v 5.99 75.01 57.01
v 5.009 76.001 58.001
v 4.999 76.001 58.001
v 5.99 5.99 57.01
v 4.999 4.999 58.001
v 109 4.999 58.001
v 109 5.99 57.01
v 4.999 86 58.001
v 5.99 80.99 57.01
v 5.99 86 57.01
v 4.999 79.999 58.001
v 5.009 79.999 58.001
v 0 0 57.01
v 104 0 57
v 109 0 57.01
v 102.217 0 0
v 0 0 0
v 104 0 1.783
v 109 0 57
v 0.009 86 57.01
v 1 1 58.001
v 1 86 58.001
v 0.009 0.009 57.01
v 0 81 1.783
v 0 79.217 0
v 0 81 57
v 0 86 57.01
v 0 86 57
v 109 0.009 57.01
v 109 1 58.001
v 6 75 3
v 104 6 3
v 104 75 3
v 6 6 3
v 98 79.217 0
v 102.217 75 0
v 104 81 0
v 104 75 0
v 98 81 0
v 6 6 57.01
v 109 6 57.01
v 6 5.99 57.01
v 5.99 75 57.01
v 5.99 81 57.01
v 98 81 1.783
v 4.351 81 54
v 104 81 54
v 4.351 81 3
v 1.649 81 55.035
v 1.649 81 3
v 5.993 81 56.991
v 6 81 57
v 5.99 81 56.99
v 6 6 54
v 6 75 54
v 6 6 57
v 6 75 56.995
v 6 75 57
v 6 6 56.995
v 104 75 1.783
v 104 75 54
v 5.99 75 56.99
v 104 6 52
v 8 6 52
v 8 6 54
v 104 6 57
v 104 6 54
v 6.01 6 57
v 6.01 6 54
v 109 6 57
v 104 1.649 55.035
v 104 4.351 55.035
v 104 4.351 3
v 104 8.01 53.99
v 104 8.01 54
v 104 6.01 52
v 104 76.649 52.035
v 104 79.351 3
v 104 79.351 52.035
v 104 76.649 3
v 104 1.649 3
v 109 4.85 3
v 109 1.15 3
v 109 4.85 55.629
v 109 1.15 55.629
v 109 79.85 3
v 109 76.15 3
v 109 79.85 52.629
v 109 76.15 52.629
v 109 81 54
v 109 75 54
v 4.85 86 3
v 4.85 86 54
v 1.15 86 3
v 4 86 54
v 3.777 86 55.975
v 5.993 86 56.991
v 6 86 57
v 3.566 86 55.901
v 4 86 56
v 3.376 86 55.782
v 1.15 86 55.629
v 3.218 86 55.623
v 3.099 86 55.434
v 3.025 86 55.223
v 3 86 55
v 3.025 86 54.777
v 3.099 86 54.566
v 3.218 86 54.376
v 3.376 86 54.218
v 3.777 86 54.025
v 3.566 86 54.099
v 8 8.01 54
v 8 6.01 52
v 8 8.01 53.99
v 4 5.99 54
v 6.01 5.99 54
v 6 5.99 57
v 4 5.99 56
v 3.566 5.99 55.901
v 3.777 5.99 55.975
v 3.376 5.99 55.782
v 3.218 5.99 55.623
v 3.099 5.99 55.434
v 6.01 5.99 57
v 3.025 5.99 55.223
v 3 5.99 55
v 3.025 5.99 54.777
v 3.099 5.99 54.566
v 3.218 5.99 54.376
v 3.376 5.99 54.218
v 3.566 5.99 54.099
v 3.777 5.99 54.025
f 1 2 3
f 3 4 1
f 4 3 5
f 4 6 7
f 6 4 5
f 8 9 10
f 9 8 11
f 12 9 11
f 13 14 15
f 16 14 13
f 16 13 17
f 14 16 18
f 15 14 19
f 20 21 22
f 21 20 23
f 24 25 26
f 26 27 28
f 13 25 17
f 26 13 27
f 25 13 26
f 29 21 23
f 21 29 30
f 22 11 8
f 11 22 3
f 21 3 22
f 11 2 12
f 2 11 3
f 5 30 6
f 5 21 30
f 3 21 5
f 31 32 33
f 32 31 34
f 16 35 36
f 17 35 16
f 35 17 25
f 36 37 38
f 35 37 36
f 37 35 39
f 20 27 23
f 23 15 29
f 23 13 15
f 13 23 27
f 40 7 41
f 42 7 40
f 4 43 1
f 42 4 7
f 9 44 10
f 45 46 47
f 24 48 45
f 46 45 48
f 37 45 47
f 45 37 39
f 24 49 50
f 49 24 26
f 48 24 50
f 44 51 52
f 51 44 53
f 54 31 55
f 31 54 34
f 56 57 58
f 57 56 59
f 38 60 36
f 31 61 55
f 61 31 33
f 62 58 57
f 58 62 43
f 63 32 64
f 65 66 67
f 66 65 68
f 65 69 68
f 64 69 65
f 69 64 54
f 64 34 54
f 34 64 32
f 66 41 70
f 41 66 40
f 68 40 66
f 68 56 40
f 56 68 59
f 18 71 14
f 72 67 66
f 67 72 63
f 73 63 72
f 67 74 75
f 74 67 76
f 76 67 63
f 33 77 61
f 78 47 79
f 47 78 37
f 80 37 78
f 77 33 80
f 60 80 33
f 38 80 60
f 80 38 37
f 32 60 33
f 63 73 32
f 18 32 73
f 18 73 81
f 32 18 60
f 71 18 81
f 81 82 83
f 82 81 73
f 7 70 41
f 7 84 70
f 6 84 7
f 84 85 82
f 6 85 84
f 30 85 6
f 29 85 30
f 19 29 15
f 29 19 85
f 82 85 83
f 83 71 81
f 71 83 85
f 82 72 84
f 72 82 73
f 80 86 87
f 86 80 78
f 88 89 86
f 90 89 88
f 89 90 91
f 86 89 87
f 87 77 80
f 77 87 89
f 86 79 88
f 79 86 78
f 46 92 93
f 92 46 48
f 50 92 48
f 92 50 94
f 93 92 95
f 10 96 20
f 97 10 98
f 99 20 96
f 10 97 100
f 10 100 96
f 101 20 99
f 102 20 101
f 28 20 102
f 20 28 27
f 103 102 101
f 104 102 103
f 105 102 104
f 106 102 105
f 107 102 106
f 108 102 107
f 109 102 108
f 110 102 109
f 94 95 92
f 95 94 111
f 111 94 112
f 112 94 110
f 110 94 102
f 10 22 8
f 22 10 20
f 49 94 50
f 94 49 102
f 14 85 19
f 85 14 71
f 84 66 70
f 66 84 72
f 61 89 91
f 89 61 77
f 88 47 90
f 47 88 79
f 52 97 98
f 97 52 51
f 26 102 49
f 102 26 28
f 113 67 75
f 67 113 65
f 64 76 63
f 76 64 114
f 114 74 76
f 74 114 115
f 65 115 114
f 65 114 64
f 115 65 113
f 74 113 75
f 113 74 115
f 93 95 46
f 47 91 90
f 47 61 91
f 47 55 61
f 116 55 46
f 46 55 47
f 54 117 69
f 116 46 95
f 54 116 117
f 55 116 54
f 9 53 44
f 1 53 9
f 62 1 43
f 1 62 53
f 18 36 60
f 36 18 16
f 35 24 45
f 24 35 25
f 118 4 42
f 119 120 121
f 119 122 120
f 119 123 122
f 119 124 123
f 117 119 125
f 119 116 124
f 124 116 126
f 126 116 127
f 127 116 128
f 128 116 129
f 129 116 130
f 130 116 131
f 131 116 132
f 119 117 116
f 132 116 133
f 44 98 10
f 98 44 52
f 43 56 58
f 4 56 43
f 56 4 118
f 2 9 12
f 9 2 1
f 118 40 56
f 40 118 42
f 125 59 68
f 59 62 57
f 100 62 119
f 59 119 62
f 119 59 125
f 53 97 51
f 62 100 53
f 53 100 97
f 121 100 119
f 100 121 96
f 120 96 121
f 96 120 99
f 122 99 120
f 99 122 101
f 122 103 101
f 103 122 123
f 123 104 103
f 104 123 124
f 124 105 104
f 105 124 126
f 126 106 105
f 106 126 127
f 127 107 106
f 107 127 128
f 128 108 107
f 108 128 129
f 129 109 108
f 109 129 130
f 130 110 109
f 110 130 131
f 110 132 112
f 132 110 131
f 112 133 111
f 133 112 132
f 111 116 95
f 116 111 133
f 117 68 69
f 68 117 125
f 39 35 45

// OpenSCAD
// ============================================================================
// cutlery_box.scad
// Graduated 3-chamber disposable-cutlery box (Option 3) — CUT-FROM-SOLID port
// of build_box.py, for a 120 x 120 x 120 mm printer (AOSEED).
//
// WHY THIS PORT EXISTS (the whole point):
//   The hand-mesh generator (build_box.py) could not keep the 1 mm rim chamfer
//   continuous across the female dovetail joints, because where a slot's flared
//   corner crosses the sloped chamfer it needs a true boolean intersection.
//   OpenSCAD HAS that boolean kernel, so here we do exactly the "cut-from-solid"
//   thing:
//      1. Build the ENTIRE box as ONE solid, WITH the chamfer already on it.
//      2. difference() out vertical dovetail prisms ( /_\ cross-section ),
//         running from just above the base plate up THROUGH the rim, to both
//         (a) form the sliding-dovetail joints, and
//         (b) split the box into 6 bed-sized pieces.
//   Because the cut is a real boolean through the already-chamfered solid, the
//   sloped chamfer<->slot edge is produced for free => the rim chamfer stays
//   CONTINUOUS across every joint, with none of the sliver hacks.
//
// ----------------------------------------------------------------------------
// HOW TO USE
//   In the app:  set `part` below (or use the Customizer dropdown), F5 to
//                preview, F6 to render, then File > Export > STL.
//   One piece (CLI):
//      openscad -o body_knife_A.stl -D 'part="knife_A"' cutlery_box.scad
//   ALL SIX (bash, run from this folder):
//      for p in knife_A knife_B fork_A fork_B spoon_A spoon_B; do \
//        openscad -o "body_$p.stl" -D "part=\"$p\"" cutlery_box.scad ; done
//   PNG preview of one piece:
//      openscad -o knife_B.png --imgsize=1400,1000 --autocenter --viewall \
//        -D 'part="knife_B"' cutlery_box.scad
//
//   Pieces are modelled in ASSEMBLED coordinates (floor-down, z=0 is the bed),
//   so importing all six STLs together shows the assembled box directly; your
//   slicer will auto-drop each one onto the plate for printing.
//
// BED SANITY: every piece is <= 120 mm in X, Y, Z.
//   Z = 58 mm. Widest piece = spoon at 117 mm (Y). A-halves reach 109 mm (X,
//   including the protruding dovetail key). All under 120.
//
// !! I could NOT run OpenSCAD to verify this file (no binary in my sandbox) !!
//   - The rim chamfer is a SMOOTH, true-45 bevel built from hull() frustums of
//     convex rectangles. Works in every OpenSCAD since ~2015 (incl. Homebrew
//     2021.01). No stepped staircase -- and, crucially, it makes box() a clean
//     well-formed solid so the per-part booleans resolve reliably (the old
//     14-slice staircase was fragile and CGAL was dropping the walls of the
//     interior parts, leaving only the key prisms => "floating boxes").
//   - roof() is still available behind USE_ROOF=true for those who have it
//     (2021.01+ snapshots); for THIS rectangular design it is identical, so it
//     is NOT required.
//   - After F6, check the console for "WARNING"/"not a valid 2-manifold".
//     If a tenon ever looks detached, bump EPS to 0.05.
// ============================================================================


/* [Part to render / export] */
part = "knife_A"; // [knife_A, knife_B, fork_A, fork_B, spoon_A, spoon_B, assembly]

/* [Chamfer method] */
// false = smooth hull() frustum bevel (default, any OpenSCAD); true = roof() (2021.01+)
USE_ROOF = false;

/* [Heights (mm)] */
BASE   = 3.0;     // floor / base-plate thickness
COMP_H = 55.0;    // interior wall height above the floor (cutlery stack depth)

/* [Walls (mm)] */
HOST_T   = 6.0;     // thickness of every wall (thick enough to host a dovetail)
HALF_LEN = 104.0;   // printed length of each half (A = near, B = far); <120 incl. key

/* [Chamber bays (mm)] */
N_COL     = 3;       // columns of cutlery per chamber
KNIFE_COL = 23.0;    // -> knife bay 69  (3 x 19 mm knives + play)
FORK_COL  = 33.0;    // -> fork  bay 99  (3 x 29 mm forks  + play)
SPOON_COL = 37.0;    // -> spoon bay 111 (3 x 34 mm spoons + play, trimmed <120)

/* [Dovetail joint (mm)] */
// TRIAL-PRINT FIX (Option A) set the FEMALE socket to neck 1.5 / flare 2.0 half
//   (= DT_NECK+DT_CLR / DT_FLARE+DT_CLR), giving ear = HOST_T/2 - flare 2.0 = 1.0 mm.
//   That female side printed great and is now FINAL.
// KEY #2 (full-height slide test, 2026-06): the male was too loose at 0.3 mm/side
//   (popped when pulled horizontally). We tighten the per-side slide clearance
//   0.3 -> 0.15 by GROWING the male tail to neck 1.35 / flare 1.85 half. The SOCKET is
//   UNCHANGED (1.35+0.15 = 1.5, 1.85+0.15 = 2.0), so the already-printed female side is
//   not affected. ear = 3 - (1.85+0.15) = 1.0 mm and undercut hook (DT_FLARE-DT_NECK)
//   = 0.5 mm are both UNCHANGED; only the slide clearance tightens.
DT_DEPTH = 5.0;   // tail protrusion past the seam (male key depth)
DT_NECK  = 1.35;  // male half-width at the seam face (narrow)  [key#2: was 1.2]
DT_FLARE = 1.85;  // male half-width at the tip (wide -> locks) [key#2: was 1.7]
DT_CLR   = 0.15;  // FLANK/seam slide clearance added for the female socket [key#2: was 0.3]
DT_DEPTH_RELIEF = 0.3; // extra depth on the socket BACK only, so the tail tip never bottoms out
// ---- FUTURE TRIAL — Option B (thicker ears still: 1.2 mm) -------------------------
// If Option A's ears still feel thin, try Option B. It buys another 0.2 mm of ear by
// also narrowing the MALE neck (so the male gets a little weaker — that's the trade):
//     DT_NECK  = 1.0;   // was 1.2  (male neck 2.4 -> 2.0 mm full width)
//     DT_FLARE = 1.5;   // was 2.1
//     DT_CLR   = 0.3;   // same as Option A
//   -> ear = 3 - (1.5 + 0.3) = 1.2 mm ; undercut hook = 1.5 - 1.0 = 0.5 mm (same as A).
// Only switch ONE option in at a time; re-test the knife pair before committing all six.
// ----------------------------------------------------------------------------------

/* [Hidden-dovetail top cap / "hat" (mm)] */
// The dovetail otherwise shows its trapezoid outline on the TOP edge of the wall.
// To hide it, the MALE piece extends the wall's full-width top (chamfer included)
// across the key footprint -> a flush, continuous top. The FEMALE piece gets a
// matching top RECESS (cap footprint + CAP_CLR) so the cap drops straight in.
// Result: the top reads as one surface with a single straight seam line at the cap
// tip; the dovetail joinery lives entirely below the cap.
//
// SELF-SUPPORTING UNDERSIDE: the cap reaches the FULL wall width at the chamfer base
// (so the top edge reads as the wall extended, with NO recessed sliver on the outer
// face), and its underside is ONE planar ramp from the chamfer's OUTER CORNER
// (half-width HOST_T/2 at z = BODY_H-CHAMFER) down to the dovetail-neck half-width
// (CAP_FOOT) at CAP_SLANT_DEG from horizontal. No little horizontal step. The ramp
// reaching full width exactly at the chamfer base means "ramp top" == "chamfer base"
// (CAP_H is DERIVED). The FEMALE recess is the same ramp + CAP_CLR play.
// TRADEOFF: because the cap runs all the way to the outer corner, the female wall
// tapers to ~0 at z = BODY_H-CHAMFER -> a thin feather edge at the joint (gradual at
// CAP_SLANT_DEG, hidden inside the joint when assembled). Accepted per design intent.
CAP_SLANT_DEG = 50;     // cap underside ramp angle from horizontal (50 = self-supporting, long flare)
CAP_FOOT = 1.2;         // cap-underside half-width [PINNED to the pre-key#2 neck so the
                        // FINAL female cap-recess (CAP_FOOT+CAP_CLR) is unchanged; the
                        // 0.15 mm tongue-vs-cap-foot step is buried inside the joint]
CAP_CLR = 0.3;          // slide clearance so the male cap seats into the female top recess

/* [Rim chamfer (mm)] */
CHAMFER = 1.0;    // 45-deg comfort break broken along the top wall edges

/* [Base half-lap / anti-warp (mm)] */
// Neighbouring base plates overlap as a HORIZONTAL half-lap (shiplap) at mid-base
// height, so corners stay coplanar (no lift/protrusion). Horizontal lap faces do
// NOT bind the vertical-drop assembly. Shingle direction: A->B and knife->fork->spoon.
LAP_LEN = 6;        // overlap past the A/B seam and the knife/fork seam
LAP_LEN_FS = 2;     // overlap past the fork/SPOON seam -- SMALLER: spoon is the
                    // tightest piece (117mm of the 120mm bed); a 6mm lap there
                    // would push spoon to 123mm. 2mm keeps spoon at 119mm.
LAP_Z   = BASE/2;   // 1.5 -- horizontal split height of the lap (bottom vs top half)
LAP_CLR = 0.2;      // in-plane clearance so the shelf isn't a press fit

/* [Lid — box features that receive a flat ORDERED clear sheet] */
// The lid itself is NOT printed: it's a flat ~2 mm PETG/Tritan sheet, bullnose-polished
// edges (r=LID_EDGE_R), ordered to size. We only model the box features that receive it.
LID_T            = 2.0;   // ordered sheet thickness
LID_EDGE_R       = 1.0;   // ordered sheet bullnose edge radius (for the sheet order spec)
LID_PLAY         = 0.4;   // total vertical play in the hinge groove (sheet + this)
LID_RECESS       = 2.0;   // lid TOP sits this far BELOW the rim, so the journal pocket is fully
                          // capped (rim caps the bullnose -> retains the lid when raised; tilt-in)
HINGE_AT_MINUS_X = true;  // hinge on the -x (303mm) end wall; clip on +x. (flip = mirror; default delivered)
// perimeter support ledge (lid underside rests on it at z = BODY_H-LID_T)
LEDGE_W          = 2.0;   // ledge inward protrusion (its underside ramps back at 45 deg -> self-supporting)
GROOVE_END_INSET = 0.0;   // groove reaches the corners but RUNS OUT smoothly there (no end-face / no
                          // exposed bore); GROOVE_TAPER sets the run-out length
GROOVE_TAPER     = 4.0;   // y-length over which the eased mouth tapers out at each groove end
// hinge journal (cut into the inner face of the hinge end wall, CONTINUOUS along the long edge)
GROOVE_DEPTH     = 3.0;   // 2mm lead-in slot + 1mm pocket radius -> journal sits 2mm back from the
                          // face so its cap clears the swing relief and RETAINS the lid
GROOVE_POCKET_R  = 1.0;   // journal half-cylinder radius (the bullnose sheet edge rolls in it)
// clip latch — TWO light DETENT clips on the clip end wall, flanking a central finger notch.
// "Light detent" = small overhang so the rigid sheet pops past it by hand (not a firm lock).
CLIP_W           = 8.0;   // width of EACH of the two clips
CLIP_LIP         = 0.3;   // retaining overhang (light detent; 0.3 soft .. 0.6 firm-but-stiff)
CLIP_RAMP_H      = 1.6;   // cam-ramp height (press-to-close lead-in)
// finger notch — a through-cut in the clip wall (visible from outside), centered between the
// two clips, so a fingertip can reach the lid edge and lift it (popping both clips at once).
NOTCH_W          = 20.0;  // finger-notch width
NOTCH_DEPTH      = 6.0;   // how far down from the rim to the deepest point (past the lid edge)
NOTCH_ARCH       = 4.0;   // bottom is an ELLIPTICAL arch this tall; the rest is vertical sides
                          // (NOTCH_ARCH < NOTCH_W/2 -> a gentle arch, not a deep half-circle)


/* [Hidden] */
EPS      = 0.01;          // tiny overlap so abutting solids fuse cleanly in CGAL
// Upper-chamber pieces (fork, spoon) were cut by a cell plane laid EXACTLY on the
// divider wall's far face (the lower chamber owns that wall). intersection() along a
// plane coincident with an existing box face makes CGAL leave a ZERO-THICKNESS copy
// of the wall face -> edge-manifold + "watertight" but degenerate (OpenSCAD shows it
// as a blue back-face; Tinkercad thickens it into a phantom block). SEAM_EPS nudges
// those cut planes a hair INTO the open bay so they no longer coincide with any box
// face -> no flap. 0.02 mm is physically nothing but is well clear of CGAL's tolerance.
SEAM_EPS = 0.02;
CUT_OVER = 1.0;           // how far dovetail cutters overshoot the rim (clean cut)

BODY_H    = BASE + COMP_H;     // 58  total height
END_WALL  = HOST_T;            // end walls are dovetail hosts too -> equally thick
TOTAL_LEN = 2 * HALF_LEN;      // 208 assembled length (end wall .. end wall)

// hidden-cap ramp geometry (derived).
//   CAP_HW    = cap MAX half-width = HOST_T/2 (the full wall edge) at the chamfer base.
//   CAP_RISE  = vertical height of the self-supporting CAP_SLANT_DEG underside ramp.
//   CAP_ZRAMP = where the cap reaches full width = the chamfer base (BODY_H-CHAMFER), so
//               the ramp runs straight to the chamfer OUTER CORNER (no horizontal step).
//   CAP_ZBOT  = cap bottom = ramp start; CAP_H derived from it (for reference/report).
//   CAP_ZRAMP_R = recess ramp top, shifted down by CAP_CLR so the recess ramp stays
//               parallel to the cap ramp with uniform play.
CAP_HW      = HOST_T/2;   // cap reaches the FULL wall edge at the chamfer base
CAP_RISE    = (CAP_HW - CAP_FOOT) * tan(CAP_SLANT_DEG);
CAP_ZRAMP   = BODY_H - CHAMFER;               // full width exactly at the chamfer base / outer corner
CAP_ZBOT    = CAP_ZRAMP - CAP_RISE;
CAP_H       = BODY_H - CAP_ZBOT;              // derived; reported
CAP_ZRAMP_R = CAP_ZRAMP;   // recess ramp ALSO tops at the chamfer corner (mirror the cap) -> no vertical lip
// sanity checks
assert(CAP_ZBOT > BASE + 1,
       "cap zone dips too low -- raise CAP_SLANT_DEG");
assert(CAP_HW >= DT_FLARE,
       "cap too narrow to cover the dovetail tail");

// NOTE: lid-derived constants are defined BELOW the Y-layout block, because some of
// them (INTERIOR_Y0/Y1, CLIP_CY) depend on OUTER_L / OUTER_R / EXT_W. See "lid derived".

// bay widths
KNIFE_BAY = N_COL * KNIFE_COL; // 69
FORK_BAY  = N_COL * FORK_COL;  // 99
SPOON_BAY = N_COL * SPOON_COL; // 111

// ---- Y layout (width direction): wall | bay | divider | bay | divider | bay | wall
KNIFE_Y0 = 0;
KNIFE_Y1 = HOST_T + KNIFE_BAY + HOST_T;        // 0..81   (outer wall + bay + divider)
FORK_Y0  = KNIFE_Y1;                           // 81
FORK_Y1  = FORK_Y0 + FORK_BAY + HOST_T;        // 81..186 (bay + divider)
SPOON_Y0 = FORK_Y1;                            // 186
SPOON_Y1 = SPOON_Y0 + SPOON_BAY + HOST_T;      // 186..303(bay + outer wall)
EXT_W    = SPOON_Y1;                           // 303 total width

// lengthwise wall Y-bands [y0,y1] (host the A/B dovetails) + their centers
OUTER_L  = [0, HOST_T];                                       // [0,6]    c=3
DIV_KF   = [HOST_T + KNIFE_BAY, HOST_T + KNIFE_BAY + HOST_T]; // [75,81]  c=78
DIV_FS   = [FORK_Y0 + FORK_BAY, FORK_Y0 + FORK_BAY + HOST_T]; // [180,186]c=183
OUTER_R  = [SPOON_Y1 - HOST_T, SPOON_Y1];                     // [297,303]c=300

// ---- lid derived ---- (placed AFTER OUTER_L/OUTER_R/EXT_W so nothing is forward-referenced)
LID_TOP_Z   = BODY_H - LID_RECESS;        // 56  lid TOP (recessed); rim z=58 rises LID_RECESS above it
LID_Z_UNDER = LID_TOP_Z - LID_T;          // 54  lid underside / ledge top / lowered-divider top
POCKET_CZ   = LID_TOP_Z - LID_T/2;        // 55  journal centre (lid mid) -> pocket top = LID_TOP_Z = capped
// hinge end-wall inner face x + inward direction; clip end-wall inner face x + inward dir
HINGE_INX   = HINGE_AT_MINUS_X ? END_WALL : TOTAL_LEN - END_WALL;       // 6  (default)
HINGE_IN    = HINGE_AT_MINUS_X ? 1 : -1;  // interior direction from the hinge wall (+x default)
CLIP_INX    = HINGE_AT_MINUS_X ? TOTAL_LEN - END_WALL : END_WALL;       // 202 (default)
CLIP_IN     = HINGE_AT_MINUS_X ? -1 : 1;  // interior direction from the clip wall (-x default)
POCKET_CX   = HINGE_INX - HINGE_IN*(GROOVE_DEPTH - GROOVE_POCKET_R);    // 5  pocket centre x (INTO the wall)
INTERIOR_Y0 = OUTER_L[1];                 // 6   inner face of the -y short wall
INTERIOR_Y1 = OUTER_R[0];                 // 297 inner face of the +y short wall
CLIP_CY     = EXT_W/2;                     // 151.5 clip/scallop centre (in the fork chamber)
assert(POCKET_CZ - GROOVE_POCKET_R > BASE + 1,
       "journal dips too low -- reduce LID_RECESS or LID_T");
assert(POCKET_CZ + GROOVE_POCKET_R <= LID_TOP_Z + EPS,
       "journal not capped -- lower the lid (raise LID_RECESS) or shrink GROOVE_POCKET_R");
// NOTE: with LID_RECESS the lid underside (and lowered dividers) sit BELOW CAP_ZBOT. That is
// intended: the inner dividers are cut flat below the cap zone (their hidden caps are removed,
// but the lid covers them); the perimeter/end-wall caps are untouched (full-height walls).

// the three OPEN bays are rectangular holes in the wall footprint:
//   footprint = outer rectangle MINUS these bays  (== the 6 walls; verified).
// The smooth chamfer is built from exactly this decomposition.
BAY_X0 = END_WALL;              // 6
BAY_X1 = TOTAL_LEN - END_WALL;  // 202
BAYS = [
    [BAY_X0, BAY_X1, HOST_T,   HOST_T + KNIFE_BAY],   // knife bay [6,202] x [6,75]
    [BAY_X0, BAY_X1, FORK_Y0,  FORK_Y0 + FORK_BAY],   // fork  bay [6,202] x [81,180]
    [BAY_X0, BAY_X1, SPOON_Y0, SPOON_Y0 + SPOON_BAY], // spoon bay [6,202] x [186,297]
];

YC_OUTL  = OUTER_L[0] + HOST_T/2;   // 3   outer-left wall center
YC_DIVKF = DIV_KF[0]  + HOST_T/2;   // 78  knife/fork divider center
YC_DIVFS = DIV_FS[0]  + HOST_T/2;   // 183 fork/spoon divider center
YC_OUTR  = OUTER_R[0] + HOST_T/2;   // 300 outer-right wall center

// seams
AB_SEAM = HALF_LEN;               // 104  A/B length seam (x)
SEAM_KF = FORK_Y0;                // 81   knife/fork width seam (y)
SEAM_FS = SPOON_Y0;              // 186  fork/spoon width seam (y)
ENDC_A  = END_WALL/2;             // 3    A end-wall center (x) -> chamber dovetails
ENDC_B  = TOTAL_LEN - END_WALL/2; // 205  B end-wall center (x)


// ============================================================================
// 2D wall footprint (cross-section of all walls, constant in z for the straight
// part). Union of: 2 full-width end walls + 4 lengthwise walls between them.
// ============================================================================
module wall_footprint_2d() {
    // footprint = outer rectangle minus the 3 open bays  (== the 6 walls)
    difference() {
        square([TOTAL_LEN, EXT_W]);
        for (b = BAYS) translate([b[0], b[2]]) square([b[1] - b[0], b[3] - b[2]]);
    }
}

// ============================================================================
// The full chamfered box solid = base plate + walls with a continuous 1 mm
// top-rim chamfer. Built ONCE; every piece is carved out of this.
// ============================================================================
module chamfer_cap() {
    // SMOOTH 45 rim chamfer over z[BODY_H-CHAMFER, BODY_H], in absolute coords.
    zm = BODY_H - CHAMFER;
    if (USE_ROOF) {
        // exact straight-skeleton roof, capped at CHAMFER height (needs roof()).
        intersection() {
            translate([0,0,zm]) roof() wall_footprint_2d();
            translate([0,0,zm]) linear_extrude(CHAMFER + EPS) wall_footprint_2d();
        }
    } else {
        // DEFAULT: true 45 bevel as hull() frustums of CONVEX rectangles -> smooth
        // AND a clean manifold.  Since footprint = outer - bays, the chamfer of the
        // footprint = (outer rectangle beveled inward) MINUS (each bay beveled so it
        // grows toward the top, which bevels every bay-facing rim).  All hull()s are
        // on convex rectangles, so nothing gets convex-filled.
        difference() {
            // outer perimeter frustum: full outer rect at zm -> inset by CHAMFER at top
            hull() {
                translate([0,0,zm])     linear_extrude(0.001) square([TOTAL_LEN, EXT_W]);
                translate([0,0,BODY_H]) linear_extrude(0.001) offset(delta=-CHAMFER) square([TOTAL_LEN, EXT_W]);
            }
            // each bay grows by CHAMFER toward the top -> bevels its surrounding rim.
            // (overshoots z a hair past both ends so the cut is clean.)
            for (b = BAYS)
                hull() {
                    translate([0,0,zm-EPS])     linear_extrude(0.001)
                        translate([b[0],b[2]]) offset(delta=-EPS)        square([b[1]-b[0], b[3]-b[2]]);
                    translate([0,0,BODY_H+EPS]) linear_extrude(0.001)
                        translate([b[0],b[2]]) offset(delta=CHAMFER+EPS) square([b[1]-b[0], b[3]-b[2]]);
                }
        }
    }
}

module box() {
    zm = BODY_H - CHAMFER;
    union() {
        cube([TOTAL_LEN, EXT_W, BASE]);                                        // base plate z[0,3]
        translate([0,0,BASE]) linear_extrude(zm - BASE + EPS) wall_footprint_2d(); // straight walls z[3,57]
        chamfer_cap();                                                         // smooth chamfer z[57,58]
    }
}

// ============================================================================
// Dovetail prisms ( /_\ ). Vertical, z[BASE, BODY_H+CUT_OVER] so they cut
// through the rim but leave the base plate continuous. The near face is pushed
// back EPS so a male key always fuses to its wall.
//   male key   : half_n=DT_NECK,         half_f=DT_FLARE
//   female slot: half_n=DT_NECK+DT_CLR,  half_f=DT_FLARE+DT_CLR
// ============================================================================
module dt_prism_X(seam_x, yc, half_n, half_f) {   // perpendicular to X, grows +X
    translate([0,0,BASE]) linear_extrude(BODY_H - BASE + CUT_OVER)
        polygon([[seam_x - EPS,        yc - half_n],
                 [seam_x + DT_DEPTH,   yc - half_f],
                 [seam_x + DT_DEPTH,   yc + half_f],
                 [seam_x - EPS,        yc + half_n]]);
}
module dt_prism_Y(seam_y, xc, half_n, half_f) {   // perpendicular to Y, grows +Y
    translate([0,0,BASE]) linear_extrude(BODY_H - BASE + CUT_OVER)
        polygon([[xc - half_n, seam_y - EPS],
                 [xc - half_f, seam_y + DT_DEPTH],
                 [xc + half_f, seam_y + DT_DEPTH],
                 [xc + half_n, seam_y - EPS]]);
}
module ab_key   (yc)        { dt_prism_X(AB_SEAM, yc, DT_NECK, DT_FLARE); }
module ch_key   (seam_y, xc){ dt_prism_Y(seam_y, xc, DT_NECK, DT_FLARE); }

// Female sockets = male + DT_CLR on the flanks/seam (unchanged), PLUS a straight
// back-face relief of DT_DEPTH_RELIEF so the tail tip never bottoms out. The
// relief is a rectangle tacked onto the trapezoid's tip at the SAME flare width,
// so the angled flank faces (and their 0.4 mm slide clearance) are untouched.
module ab_socket(yc) {
    dt_prism_X(AB_SEAM, yc, DT_NECK + DT_CLR, DT_FLARE + DT_CLR);
    translate([0,0,BASE]) linear_extrude(BODY_H - BASE + CUT_OVER)
        translate([AB_SEAM + DT_DEPTH, yc - (DT_FLARE + DT_CLR)])
            square([DT_DEPTH_RELIEF, 2*(DT_FLARE + DT_CLR)]);          // back relief, +X
}
module ch_socket(seam_y, xc) {
    dt_prism_Y(seam_y, xc, DT_NECK + DT_CLR, DT_FLARE + DT_CLR);
    translate([0,0,BASE]) linear_extrude(BODY_H - BASE + CUT_OVER)
        translate([xc - (DT_FLARE + DT_CLR), seam_y + DT_DEPTH])
            square([2*(DT_FLARE + DT_CLR), DT_DEPTH_RELIEF]);          // back relief, +Y
}

// ===== hidden-dovetail top cap ("hat"), SELF-SUPPORTING underside ===============
// MALE cap: a FULL-wall-width hat whose underside is ONE planar ramp from the chamfer's
// OUTER CORNER (half-width CAP_HW = HOST_T/2 at CAP_ZRAMP = BODY_H-CHAMFER) down to the
// dovetail-neck half-width (CAP_FOOT) at CAP_SLANT_DEG from horizontal -> the self-
// supporting shoulder, running straight to the corner (no horizontal step). Built as
// hull(narrow bottom slab buried in the tail neck, full-width top slab through the rim);
// box() trims it to the wall and adds the continuous rim chamfer for free, so the outer
// top edge reads as the wall extended (no recessed sliver). The protruding NOSE is left
// SQUARE (vertical) -- hidden in the female socket when assembled.
// TRADEOFF: the female wall tapers to ~0 at z=BODY_H-CHAMFER (a thin feather edge at the
// joint, gradual at CAP_SLANT_DEG) -- accepted per design intent.
module ab_cap(yc) {   // A/B seam, grows +X past the seam (length direction)
    hull() {
        translate([AB_SEAM - EPS, yc - CAP_FOOT, CAP_ZBOT])
            cube([DT_DEPTH + EPS, 2*CAP_FOOT, EPS]);
        translate([AB_SEAM - EPS, yc - CAP_HW,   CAP_ZRAMP])
            cube([DT_DEPTH + EPS, 2*CAP_HW, (BODY_H + CUT_OVER) - CAP_ZRAMP]);
    }
}
module ch_cap(seam_y, xc) {   // chamber seam, grows +Y past the seam (in the end wall)
    hull() {
        translate([xc - CAP_FOOT, seam_y - EPS, CAP_ZBOT])
            cube([2*CAP_FOOT, DT_DEPTH + EPS, EPS]);
        translate([xc - CAP_HW,   seam_y - EPS, CAP_ZRAMP])
            cube([2*CAP_HW, DT_DEPTH + EPS, (BODY_H + CUT_OVER) - CAP_ZRAMP]);
    }
}
// FEMALE recess: the SAME ramp grown by CAP_CLR (flanks, tip, floor, and ramp shifted down
// by CAP_CLR so it stays parallel) -> the cap seats with uniform slide clearance. It opens
// to the wall edge (and a hair past, into air) so the cap's full-width corner drops in;
// this is what leaves the thin female feather at the top (accepted). Open upward + toward seam.
module ab_cap_neg(yc) {
    hull() {
        translate([AB_SEAM - EPS, yc - (CAP_FOOT + CAP_CLR), CAP_ZBOT - CAP_CLR])
            cube([DT_DEPTH + CAP_CLR + EPS, 2*(CAP_FOOT + CAP_CLR), EPS]);
        translate([AB_SEAM - EPS, yc - (CAP_HW + EPS), CAP_ZRAMP_R])
            cube([DT_DEPTH + CAP_CLR + EPS, 2*(CAP_HW + EPS), (BODY_H + CUT_OVER + 1) - CAP_ZRAMP_R]);
    }
}
module ch_cap_neg(seam_y, xc) {
    hull() {
        translate([xc - (CAP_FOOT + CAP_CLR), seam_y - EPS, CAP_ZBOT - CAP_CLR])
            cube([2*(CAP_FOOT + CAP_CLR), DT_DEPTH + CAP_CLR + EPS, EPS]);
        translate([xc - (CAP_HW + EPS), seam_y - EPS, CAP_ZRAMP_R])
            cube([2*(CAP_HW + EPS), DT_DEPTH + CAP_CLR + EPS, (BODY_H + CUT_OVER + 1) - CAP_ZRAMP_R]);
    }
}
// LOWERED-DIVIDER hat: same 50-deg self-supporting cap as ab_cap, but reaching FULL width at the
// LOWERED divider top (LID_Z_UNDER) instead of the rim -- because the inner dividers are lowered
// for the lid, which strips their normal cap. It extends above the top and is trimmed flush to
// LID_Z_UNDER by divider_lower(), so the divider top reads as one surface (dovetail hidden below).
DCAP_ZRAMP = LID_Z_UNDER;            // full width at the lowered divider top (54)
DCAP_ZBOT  = DCAP_ZRAMP - CAP_RISE;  // ramp start (neck), 50 deg below
module div_cap(yc) {        // male hat on the lowered divider (A/B seam)
    hull() {
        translate([AB_SEAM - EPS, yc - CAP_FOOT, DCAP_ZBOT])
            cube([DT_DEPTH + EPS, 2*CAP_FOOT, EPS]);
        translate([AB_SEAM - EPS, yc - CAP_HW,   DCAP_ZRAMP])
            cube([DT_DEPTH + EPS, 2*CAP_HW, (BODY_H + CUT_OVER) - DCAP_ZRAMP]);
    }
}
module div_cap_neg(yc) {    // female recess to receive div_cap (with CAP_CLR slide play)
    hull() {
        translate([AB_SEAM - EPS, yc - (CAP_FOOT + CAP_CLR), DCAP_ZBOT - CAP_CLR])
            cube([DT_DEPTH + CAP_CLR + EPS, 2*(CAP_FOOT + CAP_CLR), EPS]);
        translate([AB_SEAM - EPS, yc - (CAP_HW + EPS), DCAP_ZRAMP])
            cube([DT_DEPTH + CAP_CLR + EPS, 2*(CAP_HW + EPS), (BODY_H + CUT_OVER + 1) - DCAP_ZRAMP]);
    }
}

// rectangular cell (x[xa,xb], y[ya,yb], full height + margin) used to split pieces
module cell(xa, xb, ya, yb) {
    translate([xa, ya, -1]) cube([xb - xa, yb - ya, BODY_H + 11]);
}

// ===== base half-lap (shiplap) =================================================
// HORIZONTAL lap at mid-base height: the shelf-owner keeps its BOTTOM half
// (z 0..LAP_Z) extending LAP_LEN past the seam; the neighbour has its bottom half
// REMOVED there (keeps only the top half) and lands flat on the shelf. Horizontal
// faces => no binding during the vertical drop. Shelves live entirely in the base
// (z < BASE), well clear of the wall dovetails (z >= BASE).
// Shingle = FEMALE-first (matches the no-notch dovetail assembly order, which
// lowers the male piece onto the female): the B half owns the A/B shelf (grows
// -X into A) and the UPPER chamber (fork, spoon) owns the chamber shelf (grows
// -Y into the lower chamber).  Order: spoon, fork, knife; B before A.
module lap_shelf_X(y0, y1) {                 // B-side shelf, grows -X into A past AB_SEAM
    // +EPS past AB_SEAM so the shelf interpenetrates (not just abuts) its own B body -> fuses cleanly.
    translate([AB_SEAM - LAP_LEN, y0, 0]) cube([LAP_LEN + EPS, y1 - y0, LAP_Z]);
}
module lap_neg_X(y0, y1) {                   // A-side: remove bottom half to receive it
    translate([AB_SEAM - LAP_LEN - LAP_CLR, y0 - EPS, -EPS])
        cube([LAP_LEN + LAP_CLR + EPS, (y1 - y0) + 2*EPS, LAP_Z + EPS]);
}
module lap_shelf_Y(seam_y, x0, x1, ln=LAP_LEN) {   // upper-chamber shelf, grows -Y into lower
    // grows -Y by `ln` into the lower chamber AND +Y by 2*SEAM_EPS past the seam so it
    // always overlaps the (SEAM_EPS-nudged) body floor and stays fused -> no floating shelf.
    translate([x0, seam_y - ln, 0]) cube([x1 - x0, ln + 2*SEAM_EPS, LAP_Z]);
}
module lap_neg_Y(seam_y, x0, x1, ln=LAP_LEN) {     // lower-chamber: remove bottom half
    translate([x0 - EPS, seam_y - ln - LAP_CLR, -EPS])
        cube([(x1 - x0) + 2*EPS, ln + LAP_CLR + EPS, LAP_Z + EPS]);
}

// ----- 45-deg RAMPED chamber lap (TRIAL-PRINT FIX, fork/spoon seam only) --------
// The flat half-lap above leaves the receiver's lip floating over a 1.5 mm blind
// pocket -> support packs in and won't clean out (seen on fork_B). Replace it at
// the fork/spoon seam with a 45-deg ramped lap (Option 1): the upper chamber
// (spoon) owns a SOLID WEDGE that is full LAP_Z at the seam and tapers to 0 a
// distance LAP_Z into the lower chamber (run == rise == LAP_Z -> true 45 deg).
// The lower chamber (fork) gets the complementary ramped pocket: solid floor runs
// into its bay, and the lap underside is a 45-deg ramp down to the bed -> no flat
// roof -> prints with NO support. Built via linear_extrude (always manifold; no
// polyhedron winding to get wrong). rotate([90,0,90]) maps the local (y,z) profile
// onto the world Y-Z plane and extrudes the prism along +X.
//   spoon-owned wedge:  fs_wedge(seam_y, x0, x1)   (replaces lap_shelf_Y at SEAM_FS)
//   fork-side pocket:    fs_pocket(seam_y, x0, x1)  (replaces lap_neg_Y  at SEAM_FS)
module fs_wedge(seam_y, x0, x1) {                  // solid wedge, sits flat on the bed
    translate([x0, 0, 0])
        rotate([90, 0, 90])
            linear_extrude(x1 - x0)
                polygon([[seam_y - LAP_Z,     0],          // bay-side tip (on bed)
                         [seam_y + 2*SEAM_EPS, 0],          // seam-side foot (+overlap into spoon body -> fuses)
                         [seam_y + 2*SEAM_EPS, LAP_Z]]);    // seam-side top
}
module fs_pocket(seam_y, x0, x1) {                 // fork negative = wedge profile grown by LAP_CLR
    // offset(delta) grows every edge outward by LAP_CLR -> a UNIFORM ~0.2 mm gap on
    // the slanted mating face (a non-uniform inset would pinch to a near-press fit at
    // the seam). Costs ~0.2 mm of lip thickness near the seam (1.5 -> ~1.3 mm) -- fine,
    // the divider wall sits right on top of it. Sharp (mitred) offset: delta, no r.
    translate([x0 - EPS, 0, 0])
        rotate([90, 0, 90])
            linear_extrude((x1 - x0) + 2*EPS)
                offset(delta = LAP_CLR)
                    polygon([[seam_y - LAP_Z, 0],
                             [seam_y,         0],
                             [seam_y,         LAP_Z]]);
}

// ----- 45-deg RAMPED A/B lap (TRIAL-PRINT FIX, A/B mid-seam) --------------------
// Same idea as fs_wedge/fs_pocket but the lap runs perpendicular to X (the A/B
// seam) instead of Y. The B half owns a SOLID WEDGE full at the seam, tapering to
// 0 a distance LAP_Z into the A side (-X); the A half gets the ramped pocket. The
// profile lives in the X-Z plane; the prism runs along Y over [y0,y1].
// rotate([-90,0,0]) maps local (x,y,z) -> (x,z,-y), so a local polygon authored in
// (x, -z) extruded along local Z becomes a Y-prism with the correct X-Z profile.
// NOTE: the A/B lap is engaged by the straight-DOWN drop of the whole B row onto
// the A row; flat faces never bind, two 45-deg faces can cam, so the LAP_CLR gap is
// load-bearing here -> assembly-test this one before committing all six.
//   B-owned wedge:  ab_wedge(AB_SEAM, y0, y1)   (replaces lap_shelf_X)
//   A-side pocket:   ab_pocket(AB_SEAM, y0, y1)  (replaces lap_neg_X)
module ab_wedge(seam_x, y0, y1) {                  // solid wedge, sits flat on the bed
    translate([0, y0, 0])
        rotate([-90, 0, 0])
            linear_extrude(y1 - y0)
                polygon([[seam_x - LAP_Z,       0],          // A-side tip (on bed)
                         [seam_x + 2*SEAM_EPS,  0],          // seam-side foot (+overlap into B body -> fuses)
                         [seam_x + 2*SEAM_EPS, -LAP_Z]]);    // seam-side top (-z in local -> +z world)
}
module ab_pocket(seam_x, y0, y1) {                 // A negative = wedge grown by LAP_CLR
    translate([0, y0 - EPS, 0])
        rotate([-90, 0, 0])
            linear_extrude((y1 - y0) + 2*EPS)
                offset(delta = LAP_CLR)
                    polygon([[seam_x - LAP_Z,  0],
                             [seam_x,          0],
                             [seam_x,         -LAP_Z]]);
}

// ===== corner crossing key (TRIAL-PRINT FIX) ==================================
// At each A/B-seam x divider crossing the half-lap left a thin 1.5 mm dangling tab
// (the chamber shelf) with a floating lip above it. Instead we make a SOLID
// FULL-HEIGHT base corner on the DIVIDER-OWNING piece (so it sits right under that
// piece's own divider wall -> well anchored, no dangle, squared off), and CLIP the
// neighbour chamber shelf back by LAP_CLR so nothing collides. Added as a final
// union() AFTER the per-part cuts so the lap negatives don't eat it.
//   knife/fork divider -> boss on knife_A ; clip fork_A's SEAM_KF chamber shelf.
//   fork/spoon divider -> boss on fork_A  ; clip spoon_A's SEAM_FS chamber shelf.
// The boss spans x[seam-lap_x, seam] (the A side only) and the dangling y-strip; it
// overshoots z by EPS to fuse into the divider wall. B pieces are x>=seam -> untouched.
module corner_key(seam_x, lap_x, y0, y1) {
    translate([seam_x - lap_x, y0, 0]) cube([lap_x, y1 - y0, BASE + EPS]);
}
CORNER_CLIP = LAP_LEN + LAP_CLR;   // how far to pull a chamber shelf back from the A/B seam

// ============================================================================
// LID FEATURES (receive a flat ORDERED clear sheet; the sheet is not printed).
// All features live at the TOP (z >= ~52), ABOVE the dovetail engagement, the half-lap
// (z<1.5) and most of the hat, so the vertical-drop assembly and joints are untouched.
// EPS overlaps throughout; no coincident coplanar faces with the existing walls.
// Default orientation: HINGE on the -x end wall (A pieces), CLIP on the +x end wall
// (B pieces), clip+scallop centred on the fork (middle) chamber.
// ============================================================================

// --- perimeter support ledge: 45-deg self-supporting brackets; rest face at LID_Z_UNDER.
//     Runs along the CLIP end wall + the two short outer walls. (Hinge wall uses the groove.)
//     Built as hull(thin top edge, wall column) -> a triangular bracket whose underside is
//     a 45-deg ramp (prints floor-down with no support). ADDED to each piece (clipped by cell).
//     Each run is INSET by LEDGE_W from the perpendicular walls so the three brackets never
//     overlap at a corner and the wall's normal chamfer wraps every corner uninterrupted.
module lid_ledge() {
    cy0 = INTERIOR_Y0 + LEDGE_W;  cy1 = INTERIOR_Y1 - LEDGE_W;  cyl = cy1 - cy0;   // clip-run y span (inset)
    sx0 = END_WALL    + LEDGE_W;  sxl = (TOTAL_LEN - 2*END_WALL) - 2*LEDGE_W;       // short-run x span (inset)
    // clip end wall (x = CLIP_INX), bracket protrudes toward interior (CLIP_IN)
    hull() {
        translate([CLIP_INX + CLIP_IN*LEDGE_W, cy0, LID_Z_UNDER - EPS]) cube([EPS, cyl, EPS]);
        translate([CLIP_INX - EPS,             cy0, LID_Z_UNDER - LEDGE_W]) cube([2*EPS, cyl, LEDGE_W]);
    }
    // OUTER_L short wall (y = INTERIOR_Y0), bracket protrudes +y
    hull() {
        translate([sx0, INTERIOR_Y0 + LEDGE_W, LID_Z_UNDER - EPS]) cube([sxl, EPS, EPS]);
        translate([sx0, INTERIOR_Y0 - EPS,     LID_Z_UNDER - LEDGE_W]) cube([sxl, 2*EPS, LEDGE_W]);
    }
    // OUTER_R short wall (y = INTERIOR_Y1), bracket protrudes -y
    hull() {
        translate([sx0, INTERIOR_Y1 - LEDGE_W, LID_Z_UNDER - EPS]) cube([sxl, EPS, EPS]);
        translate([sx0, INTERIOR_Y1 - EPS,     LID_Z_UNDER - LEDGE_W]) cube([sxl, 2*EPS, LEDGE_W]);
    }
}

// --- hinge groove: ONE 2D cross-section (journal bore + lead-in slot + 45-deg swing ramp),
//     CAPPED at the recessed lid top (LID_TOP_Z), swept along the wall. At BOTH ends the whole
//     profile RUNS OUT smoothly -- it tapers to the inner-top rim corner (HINGE_INX, BODY_H) --
//     so there is NO end-face and NO exposed bore at the corners; the groove just fades into the
//     wall. The rim caps the bullnose (retains the lid, tilt-in); the 45-deg ramp is self-
//     supporting and gives the swing clearance; the cap stays full over the bullnose => retains.
module groove_profile() {                            // 2D cross-section in (x, z)
    union() {
        translate([POCKET_CX, POCKET_CZ]) circle(r = GROOVE_POCKET_R, $fn = 28);              // journal bore
        translate([POCKET_CX, LID_Z_UNDER]) square([HINGE_INX - POCKET_CX + EPS, LID_T]);     // lead-in slot
        polygon([[POCKET_CX, LID_TOP_Z], [HINGE_INX + EPS, LID_TOP_Z], [HINGE_INX + EPS, BODY_H - CHAMFER]]); // swing relief (below the rim chamfer)
        polygon([[HINGE_INX, BODY_H - CHAMFER], [HINGE_INX + EPS, BODY_H + EPS], [HINGE_INX - CHAMFER, BODY_H + EPS]]); // rim chamfer cut, CONTINUOUS through the divider junctions (no bulge)
    }
}
module groove_extrude(y0, y1) {                      // sweep the profile along the wall, y0..y1
    translate([0, y0, 0]) rotate([90,0,0]) translate([0,0,-(y1 - y0)]) linear_extrude(y1 - y0) groove_profile();
}
module hinge_groove() {
    // journal runs STRAIGHT to the end of the wall at each side; the perpendicular short wall
    // caps the bore there (no run-out). The EPS overlap tucks the bore end into the short wall.
    groove_extrude(INTERIOR_Y0 - EPS, INTERIOR_Y1 + EPS);
}

// --- lower the inner chamber dividers to the lid underside (mid-support, no sag).
//     Removes the divider top over the full length; outer walls keep full height.
module divider_lower() {
    // x-span is the CHAMBER BAY only [BAY_X0, BAY_X1] (+EPS overlap into the end walls so the
    // cut is manifold). The end/outer walls keep their full BODY_H tops; only the two INNER
    // dividers (DIV_KF, DIV_FS) are lowered.
    translate([BAY_X0 - EPS, DIV_KF[0], LID_Z_UNDER]) cube([BAY_X1 - BAY_X0 + 2*EPS, HOST_T, BODY_H - LID_Z_UNDER + CUT_OVER]);
    translate([BAY_X0 - EPS, DIV_FS[0], LID_Z_UNDER]) cube([BAY_X1 - BAY_X0 + 2*EPS, HOST_T, BODY_H - LID_Z_UNDER + CUT_OVER]);
}

// --- retaining clips (ADDED): TWO light detent lips on the clip end wall, flanking the finger
//     notch. Each lip overhangs the RECESSED lid top (LID_TOP_Z) by CLIP_LIP and gives a soft
//     hold; a lead-in ramp above it cams the lid under on close. Anchored into the wall. Light
//     enough that lifting the lid edge (through the notch) flexes the sheet past both at once.
CLIP_OFF = NOTCH_W/2 + CLIP_W/2;     // clip centre offset from CLIP_CY (clips sit just outside the notch)
module one_clip(yc) {
    translate([0, yc - CLIP_W/2, 0]) rotate([90,0,0]) translate([0,0,-CLIP_W]) linear_extrude(CLIP_W)
        polygon([[CLIP_INX - CLIP_IN*HOST_T/2, LID_TOP_Z - 0.8],         // anchor low, into the wall (fuse)
                 [CLIP_INX + CLIP_IN*CLIP_LIP, LID_TOP_Z],               // lip tip: overhang over the lid top
                 [CLIP_INX + CLIP_IN*CLIP_LIP, LID_TOP_Z + 0.4],         // lip front
                 [CLIP_INX - CLIP_IN*HOST_T/2, LID_TOP_Z + CLIP_RAMP_H]]);// lead-in ramp up into the wall
}
module lid_clip() {
    one_clip(CLIP_CY - CLIP_OFF);
    one_clip(CLIP_CY + CLIP_OFF);
}

// --- finger notch (CUT): a through-cut in the clip end wall, centred between the two clips.
//     Vertical sides + an ELLIPTICAL arched bottom (a rounded scoop, not a sharp box). Goes
//     THROUGH the wall so it reads as a visible scoop from the outside and a fingertip can
//     reach the lid edge to lift it. Deepest point is NOTCH_DEPTH below the rim.
module lid_finger_notch() {
    arch_cz = BODY_H - NOTCH_DEPTH + NOTCH_ARCH;          // z where the vertical sides meet the arc
    // vertical-sided upper part, open to the rim
    translate([CLIP_INX - EPS, CLIP_CY - NOTCH_W/2, arch_cz - EPS])
        cube([END_WALL + 2*EPS, NOTCH_W, (BODY_H + EPS) - (arch_cz - EPS)]);
    // elliptical arched bottom (y-semi = NOTCH_W/2, z-semi = NOTCH_ARCH), through the wall
    translate([CLIP_INX - EPS, CLIP_CY, arch_cz])
        scale([1, 1, NOTCH_ARCH/(NOTCH_W/2)])
        rotate([0, 90, 0])
        cylinder(h = END_WALL + 2*EPS, r = NOTCH_W/2, $fn = 48);
    // ALSO remove the support ledge across the notch span, so a fingertip can reach under the
    // lid edge here (the ledge/rail stays everywhere else to keep pinching the lid with the clips)
    lx0 = min(CLIP_INX, CLIP_INX + CLIP_IN*LEDGE_W) - EPS;
    lx1 = max(CLIP_INX, CLIP_INX + CLIP_IN*LEDGE_W) + EPS;
    translate([lx0, CLIP_CY - NOTCH_W/2, LID_Z_UNDER - LEDGE_W - EPS])
        cube([lx1 - lx0, NOTCH_W, LEDGE_W + 2*EPS]);
}

// --- restore the inner-top rim chamfer where the LOWERED dividers meet the +x (clip) end wall.
//     The box chamfer is interrupted at those junctions (the divider fills the inner side before
//     it is lowered), leaving a full-height bulge once lowered. The -x/hinge side is already
//     handled by the continuous journal chamfer; this does the same at the +x end.
module div_chamfer_fix() {
    cz = BODY_H - CHAMFER;            // 57, chamfer base
    xf = TOTAL_LEN - END_WALL;        // 202, +x clip-wall inner face
    for (yb = [DIV_KF, DIV_FS])
        translate([0, yb[0] - EPS, 0]) rotate([90,0,0]) translate([0,0,-((yb[1]-yb[0])+2*EPS)]) linear_extrude((yb[1]-yb[0])+2*EPS)
            polygon([[xf, cz], [xf - EPS, BODY_H + EPS], [xf + CHAMFER, BODY_H + EPS]]);  // bevel toward the wall (x>202)
}

// ============================================================================
// The six pieces.  piece = intersection(box, cell + own male keys) - own sockets
//   A halves are MALE on the A/B seam (keep the key); B halves are FEMALE (slot).
//   On a chamber seam the LEFT chamber is male (+Y), the right chamber is female.
// ============================================================================
// Base half-lap shingling (FEMALE-first, Option 1):
//   A/B seam  -> the B half owns the bottom shelf (grows -X), A has the negative.
//   chamber   -> the UPPER chamber (fork, spoon) owns the shelf (grows -Y); the
//                lower chamber (knife, fork) has the negative.
//   Assembly order: spoon, fork, knife; B before A (male lowered onto female).
// Center crossings (104,81)&(104,186): the CHAMBER shelf (fork_A / spoon_A) owns the
//   crossing square; the B-half A/B shelf (knife_B / fork_B) is CLIPPED short of the
//   chamber seam by LAP_LEN so two shelves never collide.
module knife_A() {                                       // placed LAST; receives everything
  union() {                                               // + corner key (added after the cuts)
    difference() {
        union() {
            intersection() {
                box();
                union() {
                    cell(-1, AB_SEAM, KNIFE_Y0 - 1, KNIFE_Y1);
                    ab_key(YC_OUTL); ab_key(YC_DIVKF); ch_key(SEAM_KF, ENDC_A);
                    ab_cap(YC_OUTL); div_cap(YC_DIVKF); ch_cap(SEAM_KF, ENDC_A);  // hide tops (divider uses LOWERED hat)
                }
            }
            intersection() { lid_ledge(); cell(-1, AB_SEAM, KNIFE_Y0 - 1, KNIFE_Y1); }  // lid support ledge
        }
        ab_pocket(AB_SEAM, KNIFE_Y0, KNIFE_Y1);   // receive knife_B's A/B wedge (ramped lap)
        fs_pocket(SEAM_KF, 0, AB_SEAM);           // receive fork_A's 45-deg wedge (ramped lap)
        hinge_groove(); divider_lower(); lid_finger_notch(); div_chamfer_fix();   // lid cuts (groove hits A pieces; divider/scallop where present)
    }
    corner_key(AB_SEAM, LAP_LEN, SEAM_KF - LAP_LEN, SEAM_KF);  // solid full-height corner under the knife/fork divider
  }
}

module knife_B() {
    difference() {
        union() {
            intersection() {
                box();
                union() {
                    cell(AB_SEAM, TOTAL_LEN + 1, KNIFE_Y0 - 1, KNIFE_Y1);
                    ch_key(SEAM_KF, ENDC_B);
                    ch_cap(SEAM_KF, ENDC_B);                // hide top (male, chamber)
                }
            }
            ab_wedge(AB_SEAM, KNIFE_Y0, KNIFE_Y1 - LAP_LEN);  // A/B wedge -> knife_A (CLIPPED at y=81 crossing)
            intersection() { lid_ledge(); cell(AB_SEAM, TOTAL_LEN + 1, KNIFE_Y0 - 1, KNIFE_Y1); }  // lid support ledge
        }
        ab_socket(YC_OUTL); ab_socket(YC_DIVKF);
        ab_cap_neg(YC_OUTL); div_cap_neg(YC_DIVKF);      // top recesses to receive knife_A's caps (divider = LOWERED hat)
        fs_pocket(SEAM_KF, AB_SEAM, TOTAL_LEN);         // receive fork_B's 45-deg wedge (ramped lap)
        hinge_groove(); divider_lower(); lid_finger_notch(); div_chamfer_fix();   // lid cuts
    }
}

module fork_A() {
  union() {                                               // + corner key (added after the cuts)
    difference() {
        union() {
            intersection() {
                box();
                union() {
                    cell(-1, AB_SEAM, FORK_Y0 + SEAM_EPS, FORK_Y1);  // -Y cut nudged off the divider face
                    ab_key(YC_DIVFS); ch_key(SEAM_FS, ENDC_A);
                    div_cap(YC_DIVFS); ch_cap(SEAM_FS, ENDC_A);       // hide tops (divider uses LOWERED hat)
                }
            }
            fs_wedge(SEAM_KF, 0, AB_SEAM - CORNER_CLIP);  // 45-deg wedge -> knife_A, CLIPPED (knife_A owns the crossing as a solid corner)
            intersection() { lid_ledge(); cell(-1, AB_SEAM, FORK_Y0 + SEAM_EPS, FORK_Y1); }  // lid support ledge (none in fork-A)
        }
        ab_pocket(AB_SEAM, FORK_Y0, FORK_Y1);           // receive fork_B's A/B wedge (ramped lap)
        ch_socket(SEAM_KF, ENDC_A);
        ch_cap_neg(SEAM_KF, ENDC_A);                    // top recess to receive knife_A's chamber cap (female)
        fs_pocket(SEAM_FS, 0, AB_SEAM);                 // receive spoon_A's 45-deg wedge (ramped lap)
        hinge_groove(); divider_lower(); lid_finger_notch(); div_chamfer_fix();   // lid cuts (groove = fork-A hinge segment; divider = DIV_FS)
    }
    corner_key(AB_SEAM, LAP_LEN, SEAM_FS - LAP_LEN_FS, SEAM_FS);  // solid full-height corner under the fork/spoon divider
  }
}

module fork_B() {
    union() {
        difference() {
            union() {
                intersection() {
                    box();
                    union() {
                        cell(AB_SEAM, TOTAL_LEN + 1, FORK_Y0 + SEAM_EPS, FORK_Y1);  // -Y cut nudged off the divider face
                        ch_key(SEAM_FS, ENDC_B);
                        ch_cap(SEAM_FS, ENDC_B);                // hide top (male, chamber)
                    }
                }
                ab_wedge(AB_SEAM, FORK_Y0, FORK_Y1 - LAP_LEN_FS); // A/B wedge -> fork_A (CLIPPED at y=186 crossing)
                fs_wedge(SEAM_KF, AB_SEAM, TOTAL_LEN);   // 45-deg wedge -> knife_B (ramped lap)
                intersection() { lid_ledge(); cell(AB_SEAM, TOTAL_LEN + 1, FORK_Y0 + SEAM_EPS, FORK_Y1); }  // lid ledge (clip-end run)
            }
            ab_socket(YC_DIVFS);
            div_cap_neg(YC_DIVFS);                           // top recess to receive fork_A's A/B cap (divider = LOWERED hat)
            ch_socket(SEAM_KF, ENDC_B);
            ch_cap_neg(SEAM_KF, ENDC_B);                    // top recess to receive knife_B's chamber cap (female)
            fs_pocket(SEAM_FS, AB_SEAM, TOTAL_LEN);     // receive spoon_B's 45-deg wedge (ramped lap)
            hinge_groove(); divider_lower(); lid_finger_notch(); div_chamfer_fix();     // lid cuts (scallop lands here)
        }
        intersection() { lid_clip(); cell(AB_SEAM, TOTAL_LEN + 1, FORK_Y0 + SEAM_EPS, FORK_Y1); }  // retaining clip, added AFTER the scallop cut
    }
}

module spoon_A() {
    difference() {
        union() {
            intersection() {
                box();
                union() {
                    cell(-1, AB_SEAM, SPOON_Y0 + SEAM_EPS, SPOON_Y1 + 1);  // -Y cut nudged off the divider face
                    ab_key(YC_OUTR);
                    ab_cap(YC_OUTR);                        // hide top (male)
                }
            }
            fs_wedge(SEAM_FS, 0, AB_SEAM - CORNER_CLIP);  // 45-deg wedge -> fork_A, CLIPPED (fork_A owns the crossing as a solid corner)
            intersection() { lid_ledge(); cell(-1, AB_SEAM, SPOON_Y0 + SEAM_EPS, SPOON_Y1 + 1); }  // lid support ledge (OUTER_R run)
        }
        ab_pocket(AB_SEAM, SPOON_Y0, SPOON_Y1);         // receive spoon_B's A/B wedge (ramped lap)
        ch_socket(SEAM_FS, ENDC_A);
        ch_cap_neg(SEAM_FS, ENDC_A);                    // top recess to receive fork_A's chamber cap (female)
        hinge_groove(); divider_lower(); lid_finger_notch(); div_chamfer_fix();   // lid cuts (groove = spoon-A hinge segment)
    }
}

module spoon_B() {                                      // placed FIRST; owns shelves
    difference() {
        union() {
            intersection() {
                box();
                union() {
                    cell(AB_SEAM, TOTAL_LEN + 1, SPOON_Y0 + SEAM_EPS, SPOON_Y1 + 1);  // -Y cut nudged off the divider face
                }
            }
            ab_wedge(AB_SEAM, SPOON_Y0, SPOON_Y1);      // A/B wedge -> spoon_A (ramped lap)
            fs_wedge(SEAM_FS, AB_SEAM, TOTAL_LEN);        // 45-deg wedge -> fork_B (ramped lap)
            intersection() { lid_ledge(); cell(AB_SEAM, TOTAL_LEN + 1, SPOON_Y0 + SEAM_EPS, SPOON_Y1 + 1); }  // lid ledge (OUTER_R + clip-end runs)
        }
        ab_socket(YC_OUTR);
        ab_cap_neg(YC_OUTR);                            // top recess to receive spoon_A's A/B cap (female)
        ch_socket(SEAM_FS, ENDC_B);
        ch_cap_neg(SEAM_FS, ENDC_B);                    // top recess to receive fork_B's chamber cap (female)
        hinge_groove(); divider_lower(); lid_finger_notch(); div_chamfer_fix();   // lid cuts
    }
}

// TRUE assembled view: the six real, separable pieces in their assembled positions
// (slower to render — many booleans — but this is what actually shows the seams, the
// lowered dividers, the hinge journal, the clip, the scallop, and all the joints).
// For a fast no-cuts preview of just the outer shell, temporarily use box(); instead.
module assembly() {
    knife_A(); knife_B(); fork_A(); fork_B(); spoon_A(); spoon_B();
}

// ============================================================================
// Render dispatch
// ============================================================================
if      (part == "knife_A")  knife_A();
else if (part == "knife_B")  knife_B();
else if (part == "fork_A")   fork_A();
else if (part == "fork_B")   fork_B();
else if (part == "spoon_A")  spoon_A();
else if (part == "spoon_B")  spoon_B();
else if (part == "assembly") assembly();
else echo(str("Unknown part: ", part));
